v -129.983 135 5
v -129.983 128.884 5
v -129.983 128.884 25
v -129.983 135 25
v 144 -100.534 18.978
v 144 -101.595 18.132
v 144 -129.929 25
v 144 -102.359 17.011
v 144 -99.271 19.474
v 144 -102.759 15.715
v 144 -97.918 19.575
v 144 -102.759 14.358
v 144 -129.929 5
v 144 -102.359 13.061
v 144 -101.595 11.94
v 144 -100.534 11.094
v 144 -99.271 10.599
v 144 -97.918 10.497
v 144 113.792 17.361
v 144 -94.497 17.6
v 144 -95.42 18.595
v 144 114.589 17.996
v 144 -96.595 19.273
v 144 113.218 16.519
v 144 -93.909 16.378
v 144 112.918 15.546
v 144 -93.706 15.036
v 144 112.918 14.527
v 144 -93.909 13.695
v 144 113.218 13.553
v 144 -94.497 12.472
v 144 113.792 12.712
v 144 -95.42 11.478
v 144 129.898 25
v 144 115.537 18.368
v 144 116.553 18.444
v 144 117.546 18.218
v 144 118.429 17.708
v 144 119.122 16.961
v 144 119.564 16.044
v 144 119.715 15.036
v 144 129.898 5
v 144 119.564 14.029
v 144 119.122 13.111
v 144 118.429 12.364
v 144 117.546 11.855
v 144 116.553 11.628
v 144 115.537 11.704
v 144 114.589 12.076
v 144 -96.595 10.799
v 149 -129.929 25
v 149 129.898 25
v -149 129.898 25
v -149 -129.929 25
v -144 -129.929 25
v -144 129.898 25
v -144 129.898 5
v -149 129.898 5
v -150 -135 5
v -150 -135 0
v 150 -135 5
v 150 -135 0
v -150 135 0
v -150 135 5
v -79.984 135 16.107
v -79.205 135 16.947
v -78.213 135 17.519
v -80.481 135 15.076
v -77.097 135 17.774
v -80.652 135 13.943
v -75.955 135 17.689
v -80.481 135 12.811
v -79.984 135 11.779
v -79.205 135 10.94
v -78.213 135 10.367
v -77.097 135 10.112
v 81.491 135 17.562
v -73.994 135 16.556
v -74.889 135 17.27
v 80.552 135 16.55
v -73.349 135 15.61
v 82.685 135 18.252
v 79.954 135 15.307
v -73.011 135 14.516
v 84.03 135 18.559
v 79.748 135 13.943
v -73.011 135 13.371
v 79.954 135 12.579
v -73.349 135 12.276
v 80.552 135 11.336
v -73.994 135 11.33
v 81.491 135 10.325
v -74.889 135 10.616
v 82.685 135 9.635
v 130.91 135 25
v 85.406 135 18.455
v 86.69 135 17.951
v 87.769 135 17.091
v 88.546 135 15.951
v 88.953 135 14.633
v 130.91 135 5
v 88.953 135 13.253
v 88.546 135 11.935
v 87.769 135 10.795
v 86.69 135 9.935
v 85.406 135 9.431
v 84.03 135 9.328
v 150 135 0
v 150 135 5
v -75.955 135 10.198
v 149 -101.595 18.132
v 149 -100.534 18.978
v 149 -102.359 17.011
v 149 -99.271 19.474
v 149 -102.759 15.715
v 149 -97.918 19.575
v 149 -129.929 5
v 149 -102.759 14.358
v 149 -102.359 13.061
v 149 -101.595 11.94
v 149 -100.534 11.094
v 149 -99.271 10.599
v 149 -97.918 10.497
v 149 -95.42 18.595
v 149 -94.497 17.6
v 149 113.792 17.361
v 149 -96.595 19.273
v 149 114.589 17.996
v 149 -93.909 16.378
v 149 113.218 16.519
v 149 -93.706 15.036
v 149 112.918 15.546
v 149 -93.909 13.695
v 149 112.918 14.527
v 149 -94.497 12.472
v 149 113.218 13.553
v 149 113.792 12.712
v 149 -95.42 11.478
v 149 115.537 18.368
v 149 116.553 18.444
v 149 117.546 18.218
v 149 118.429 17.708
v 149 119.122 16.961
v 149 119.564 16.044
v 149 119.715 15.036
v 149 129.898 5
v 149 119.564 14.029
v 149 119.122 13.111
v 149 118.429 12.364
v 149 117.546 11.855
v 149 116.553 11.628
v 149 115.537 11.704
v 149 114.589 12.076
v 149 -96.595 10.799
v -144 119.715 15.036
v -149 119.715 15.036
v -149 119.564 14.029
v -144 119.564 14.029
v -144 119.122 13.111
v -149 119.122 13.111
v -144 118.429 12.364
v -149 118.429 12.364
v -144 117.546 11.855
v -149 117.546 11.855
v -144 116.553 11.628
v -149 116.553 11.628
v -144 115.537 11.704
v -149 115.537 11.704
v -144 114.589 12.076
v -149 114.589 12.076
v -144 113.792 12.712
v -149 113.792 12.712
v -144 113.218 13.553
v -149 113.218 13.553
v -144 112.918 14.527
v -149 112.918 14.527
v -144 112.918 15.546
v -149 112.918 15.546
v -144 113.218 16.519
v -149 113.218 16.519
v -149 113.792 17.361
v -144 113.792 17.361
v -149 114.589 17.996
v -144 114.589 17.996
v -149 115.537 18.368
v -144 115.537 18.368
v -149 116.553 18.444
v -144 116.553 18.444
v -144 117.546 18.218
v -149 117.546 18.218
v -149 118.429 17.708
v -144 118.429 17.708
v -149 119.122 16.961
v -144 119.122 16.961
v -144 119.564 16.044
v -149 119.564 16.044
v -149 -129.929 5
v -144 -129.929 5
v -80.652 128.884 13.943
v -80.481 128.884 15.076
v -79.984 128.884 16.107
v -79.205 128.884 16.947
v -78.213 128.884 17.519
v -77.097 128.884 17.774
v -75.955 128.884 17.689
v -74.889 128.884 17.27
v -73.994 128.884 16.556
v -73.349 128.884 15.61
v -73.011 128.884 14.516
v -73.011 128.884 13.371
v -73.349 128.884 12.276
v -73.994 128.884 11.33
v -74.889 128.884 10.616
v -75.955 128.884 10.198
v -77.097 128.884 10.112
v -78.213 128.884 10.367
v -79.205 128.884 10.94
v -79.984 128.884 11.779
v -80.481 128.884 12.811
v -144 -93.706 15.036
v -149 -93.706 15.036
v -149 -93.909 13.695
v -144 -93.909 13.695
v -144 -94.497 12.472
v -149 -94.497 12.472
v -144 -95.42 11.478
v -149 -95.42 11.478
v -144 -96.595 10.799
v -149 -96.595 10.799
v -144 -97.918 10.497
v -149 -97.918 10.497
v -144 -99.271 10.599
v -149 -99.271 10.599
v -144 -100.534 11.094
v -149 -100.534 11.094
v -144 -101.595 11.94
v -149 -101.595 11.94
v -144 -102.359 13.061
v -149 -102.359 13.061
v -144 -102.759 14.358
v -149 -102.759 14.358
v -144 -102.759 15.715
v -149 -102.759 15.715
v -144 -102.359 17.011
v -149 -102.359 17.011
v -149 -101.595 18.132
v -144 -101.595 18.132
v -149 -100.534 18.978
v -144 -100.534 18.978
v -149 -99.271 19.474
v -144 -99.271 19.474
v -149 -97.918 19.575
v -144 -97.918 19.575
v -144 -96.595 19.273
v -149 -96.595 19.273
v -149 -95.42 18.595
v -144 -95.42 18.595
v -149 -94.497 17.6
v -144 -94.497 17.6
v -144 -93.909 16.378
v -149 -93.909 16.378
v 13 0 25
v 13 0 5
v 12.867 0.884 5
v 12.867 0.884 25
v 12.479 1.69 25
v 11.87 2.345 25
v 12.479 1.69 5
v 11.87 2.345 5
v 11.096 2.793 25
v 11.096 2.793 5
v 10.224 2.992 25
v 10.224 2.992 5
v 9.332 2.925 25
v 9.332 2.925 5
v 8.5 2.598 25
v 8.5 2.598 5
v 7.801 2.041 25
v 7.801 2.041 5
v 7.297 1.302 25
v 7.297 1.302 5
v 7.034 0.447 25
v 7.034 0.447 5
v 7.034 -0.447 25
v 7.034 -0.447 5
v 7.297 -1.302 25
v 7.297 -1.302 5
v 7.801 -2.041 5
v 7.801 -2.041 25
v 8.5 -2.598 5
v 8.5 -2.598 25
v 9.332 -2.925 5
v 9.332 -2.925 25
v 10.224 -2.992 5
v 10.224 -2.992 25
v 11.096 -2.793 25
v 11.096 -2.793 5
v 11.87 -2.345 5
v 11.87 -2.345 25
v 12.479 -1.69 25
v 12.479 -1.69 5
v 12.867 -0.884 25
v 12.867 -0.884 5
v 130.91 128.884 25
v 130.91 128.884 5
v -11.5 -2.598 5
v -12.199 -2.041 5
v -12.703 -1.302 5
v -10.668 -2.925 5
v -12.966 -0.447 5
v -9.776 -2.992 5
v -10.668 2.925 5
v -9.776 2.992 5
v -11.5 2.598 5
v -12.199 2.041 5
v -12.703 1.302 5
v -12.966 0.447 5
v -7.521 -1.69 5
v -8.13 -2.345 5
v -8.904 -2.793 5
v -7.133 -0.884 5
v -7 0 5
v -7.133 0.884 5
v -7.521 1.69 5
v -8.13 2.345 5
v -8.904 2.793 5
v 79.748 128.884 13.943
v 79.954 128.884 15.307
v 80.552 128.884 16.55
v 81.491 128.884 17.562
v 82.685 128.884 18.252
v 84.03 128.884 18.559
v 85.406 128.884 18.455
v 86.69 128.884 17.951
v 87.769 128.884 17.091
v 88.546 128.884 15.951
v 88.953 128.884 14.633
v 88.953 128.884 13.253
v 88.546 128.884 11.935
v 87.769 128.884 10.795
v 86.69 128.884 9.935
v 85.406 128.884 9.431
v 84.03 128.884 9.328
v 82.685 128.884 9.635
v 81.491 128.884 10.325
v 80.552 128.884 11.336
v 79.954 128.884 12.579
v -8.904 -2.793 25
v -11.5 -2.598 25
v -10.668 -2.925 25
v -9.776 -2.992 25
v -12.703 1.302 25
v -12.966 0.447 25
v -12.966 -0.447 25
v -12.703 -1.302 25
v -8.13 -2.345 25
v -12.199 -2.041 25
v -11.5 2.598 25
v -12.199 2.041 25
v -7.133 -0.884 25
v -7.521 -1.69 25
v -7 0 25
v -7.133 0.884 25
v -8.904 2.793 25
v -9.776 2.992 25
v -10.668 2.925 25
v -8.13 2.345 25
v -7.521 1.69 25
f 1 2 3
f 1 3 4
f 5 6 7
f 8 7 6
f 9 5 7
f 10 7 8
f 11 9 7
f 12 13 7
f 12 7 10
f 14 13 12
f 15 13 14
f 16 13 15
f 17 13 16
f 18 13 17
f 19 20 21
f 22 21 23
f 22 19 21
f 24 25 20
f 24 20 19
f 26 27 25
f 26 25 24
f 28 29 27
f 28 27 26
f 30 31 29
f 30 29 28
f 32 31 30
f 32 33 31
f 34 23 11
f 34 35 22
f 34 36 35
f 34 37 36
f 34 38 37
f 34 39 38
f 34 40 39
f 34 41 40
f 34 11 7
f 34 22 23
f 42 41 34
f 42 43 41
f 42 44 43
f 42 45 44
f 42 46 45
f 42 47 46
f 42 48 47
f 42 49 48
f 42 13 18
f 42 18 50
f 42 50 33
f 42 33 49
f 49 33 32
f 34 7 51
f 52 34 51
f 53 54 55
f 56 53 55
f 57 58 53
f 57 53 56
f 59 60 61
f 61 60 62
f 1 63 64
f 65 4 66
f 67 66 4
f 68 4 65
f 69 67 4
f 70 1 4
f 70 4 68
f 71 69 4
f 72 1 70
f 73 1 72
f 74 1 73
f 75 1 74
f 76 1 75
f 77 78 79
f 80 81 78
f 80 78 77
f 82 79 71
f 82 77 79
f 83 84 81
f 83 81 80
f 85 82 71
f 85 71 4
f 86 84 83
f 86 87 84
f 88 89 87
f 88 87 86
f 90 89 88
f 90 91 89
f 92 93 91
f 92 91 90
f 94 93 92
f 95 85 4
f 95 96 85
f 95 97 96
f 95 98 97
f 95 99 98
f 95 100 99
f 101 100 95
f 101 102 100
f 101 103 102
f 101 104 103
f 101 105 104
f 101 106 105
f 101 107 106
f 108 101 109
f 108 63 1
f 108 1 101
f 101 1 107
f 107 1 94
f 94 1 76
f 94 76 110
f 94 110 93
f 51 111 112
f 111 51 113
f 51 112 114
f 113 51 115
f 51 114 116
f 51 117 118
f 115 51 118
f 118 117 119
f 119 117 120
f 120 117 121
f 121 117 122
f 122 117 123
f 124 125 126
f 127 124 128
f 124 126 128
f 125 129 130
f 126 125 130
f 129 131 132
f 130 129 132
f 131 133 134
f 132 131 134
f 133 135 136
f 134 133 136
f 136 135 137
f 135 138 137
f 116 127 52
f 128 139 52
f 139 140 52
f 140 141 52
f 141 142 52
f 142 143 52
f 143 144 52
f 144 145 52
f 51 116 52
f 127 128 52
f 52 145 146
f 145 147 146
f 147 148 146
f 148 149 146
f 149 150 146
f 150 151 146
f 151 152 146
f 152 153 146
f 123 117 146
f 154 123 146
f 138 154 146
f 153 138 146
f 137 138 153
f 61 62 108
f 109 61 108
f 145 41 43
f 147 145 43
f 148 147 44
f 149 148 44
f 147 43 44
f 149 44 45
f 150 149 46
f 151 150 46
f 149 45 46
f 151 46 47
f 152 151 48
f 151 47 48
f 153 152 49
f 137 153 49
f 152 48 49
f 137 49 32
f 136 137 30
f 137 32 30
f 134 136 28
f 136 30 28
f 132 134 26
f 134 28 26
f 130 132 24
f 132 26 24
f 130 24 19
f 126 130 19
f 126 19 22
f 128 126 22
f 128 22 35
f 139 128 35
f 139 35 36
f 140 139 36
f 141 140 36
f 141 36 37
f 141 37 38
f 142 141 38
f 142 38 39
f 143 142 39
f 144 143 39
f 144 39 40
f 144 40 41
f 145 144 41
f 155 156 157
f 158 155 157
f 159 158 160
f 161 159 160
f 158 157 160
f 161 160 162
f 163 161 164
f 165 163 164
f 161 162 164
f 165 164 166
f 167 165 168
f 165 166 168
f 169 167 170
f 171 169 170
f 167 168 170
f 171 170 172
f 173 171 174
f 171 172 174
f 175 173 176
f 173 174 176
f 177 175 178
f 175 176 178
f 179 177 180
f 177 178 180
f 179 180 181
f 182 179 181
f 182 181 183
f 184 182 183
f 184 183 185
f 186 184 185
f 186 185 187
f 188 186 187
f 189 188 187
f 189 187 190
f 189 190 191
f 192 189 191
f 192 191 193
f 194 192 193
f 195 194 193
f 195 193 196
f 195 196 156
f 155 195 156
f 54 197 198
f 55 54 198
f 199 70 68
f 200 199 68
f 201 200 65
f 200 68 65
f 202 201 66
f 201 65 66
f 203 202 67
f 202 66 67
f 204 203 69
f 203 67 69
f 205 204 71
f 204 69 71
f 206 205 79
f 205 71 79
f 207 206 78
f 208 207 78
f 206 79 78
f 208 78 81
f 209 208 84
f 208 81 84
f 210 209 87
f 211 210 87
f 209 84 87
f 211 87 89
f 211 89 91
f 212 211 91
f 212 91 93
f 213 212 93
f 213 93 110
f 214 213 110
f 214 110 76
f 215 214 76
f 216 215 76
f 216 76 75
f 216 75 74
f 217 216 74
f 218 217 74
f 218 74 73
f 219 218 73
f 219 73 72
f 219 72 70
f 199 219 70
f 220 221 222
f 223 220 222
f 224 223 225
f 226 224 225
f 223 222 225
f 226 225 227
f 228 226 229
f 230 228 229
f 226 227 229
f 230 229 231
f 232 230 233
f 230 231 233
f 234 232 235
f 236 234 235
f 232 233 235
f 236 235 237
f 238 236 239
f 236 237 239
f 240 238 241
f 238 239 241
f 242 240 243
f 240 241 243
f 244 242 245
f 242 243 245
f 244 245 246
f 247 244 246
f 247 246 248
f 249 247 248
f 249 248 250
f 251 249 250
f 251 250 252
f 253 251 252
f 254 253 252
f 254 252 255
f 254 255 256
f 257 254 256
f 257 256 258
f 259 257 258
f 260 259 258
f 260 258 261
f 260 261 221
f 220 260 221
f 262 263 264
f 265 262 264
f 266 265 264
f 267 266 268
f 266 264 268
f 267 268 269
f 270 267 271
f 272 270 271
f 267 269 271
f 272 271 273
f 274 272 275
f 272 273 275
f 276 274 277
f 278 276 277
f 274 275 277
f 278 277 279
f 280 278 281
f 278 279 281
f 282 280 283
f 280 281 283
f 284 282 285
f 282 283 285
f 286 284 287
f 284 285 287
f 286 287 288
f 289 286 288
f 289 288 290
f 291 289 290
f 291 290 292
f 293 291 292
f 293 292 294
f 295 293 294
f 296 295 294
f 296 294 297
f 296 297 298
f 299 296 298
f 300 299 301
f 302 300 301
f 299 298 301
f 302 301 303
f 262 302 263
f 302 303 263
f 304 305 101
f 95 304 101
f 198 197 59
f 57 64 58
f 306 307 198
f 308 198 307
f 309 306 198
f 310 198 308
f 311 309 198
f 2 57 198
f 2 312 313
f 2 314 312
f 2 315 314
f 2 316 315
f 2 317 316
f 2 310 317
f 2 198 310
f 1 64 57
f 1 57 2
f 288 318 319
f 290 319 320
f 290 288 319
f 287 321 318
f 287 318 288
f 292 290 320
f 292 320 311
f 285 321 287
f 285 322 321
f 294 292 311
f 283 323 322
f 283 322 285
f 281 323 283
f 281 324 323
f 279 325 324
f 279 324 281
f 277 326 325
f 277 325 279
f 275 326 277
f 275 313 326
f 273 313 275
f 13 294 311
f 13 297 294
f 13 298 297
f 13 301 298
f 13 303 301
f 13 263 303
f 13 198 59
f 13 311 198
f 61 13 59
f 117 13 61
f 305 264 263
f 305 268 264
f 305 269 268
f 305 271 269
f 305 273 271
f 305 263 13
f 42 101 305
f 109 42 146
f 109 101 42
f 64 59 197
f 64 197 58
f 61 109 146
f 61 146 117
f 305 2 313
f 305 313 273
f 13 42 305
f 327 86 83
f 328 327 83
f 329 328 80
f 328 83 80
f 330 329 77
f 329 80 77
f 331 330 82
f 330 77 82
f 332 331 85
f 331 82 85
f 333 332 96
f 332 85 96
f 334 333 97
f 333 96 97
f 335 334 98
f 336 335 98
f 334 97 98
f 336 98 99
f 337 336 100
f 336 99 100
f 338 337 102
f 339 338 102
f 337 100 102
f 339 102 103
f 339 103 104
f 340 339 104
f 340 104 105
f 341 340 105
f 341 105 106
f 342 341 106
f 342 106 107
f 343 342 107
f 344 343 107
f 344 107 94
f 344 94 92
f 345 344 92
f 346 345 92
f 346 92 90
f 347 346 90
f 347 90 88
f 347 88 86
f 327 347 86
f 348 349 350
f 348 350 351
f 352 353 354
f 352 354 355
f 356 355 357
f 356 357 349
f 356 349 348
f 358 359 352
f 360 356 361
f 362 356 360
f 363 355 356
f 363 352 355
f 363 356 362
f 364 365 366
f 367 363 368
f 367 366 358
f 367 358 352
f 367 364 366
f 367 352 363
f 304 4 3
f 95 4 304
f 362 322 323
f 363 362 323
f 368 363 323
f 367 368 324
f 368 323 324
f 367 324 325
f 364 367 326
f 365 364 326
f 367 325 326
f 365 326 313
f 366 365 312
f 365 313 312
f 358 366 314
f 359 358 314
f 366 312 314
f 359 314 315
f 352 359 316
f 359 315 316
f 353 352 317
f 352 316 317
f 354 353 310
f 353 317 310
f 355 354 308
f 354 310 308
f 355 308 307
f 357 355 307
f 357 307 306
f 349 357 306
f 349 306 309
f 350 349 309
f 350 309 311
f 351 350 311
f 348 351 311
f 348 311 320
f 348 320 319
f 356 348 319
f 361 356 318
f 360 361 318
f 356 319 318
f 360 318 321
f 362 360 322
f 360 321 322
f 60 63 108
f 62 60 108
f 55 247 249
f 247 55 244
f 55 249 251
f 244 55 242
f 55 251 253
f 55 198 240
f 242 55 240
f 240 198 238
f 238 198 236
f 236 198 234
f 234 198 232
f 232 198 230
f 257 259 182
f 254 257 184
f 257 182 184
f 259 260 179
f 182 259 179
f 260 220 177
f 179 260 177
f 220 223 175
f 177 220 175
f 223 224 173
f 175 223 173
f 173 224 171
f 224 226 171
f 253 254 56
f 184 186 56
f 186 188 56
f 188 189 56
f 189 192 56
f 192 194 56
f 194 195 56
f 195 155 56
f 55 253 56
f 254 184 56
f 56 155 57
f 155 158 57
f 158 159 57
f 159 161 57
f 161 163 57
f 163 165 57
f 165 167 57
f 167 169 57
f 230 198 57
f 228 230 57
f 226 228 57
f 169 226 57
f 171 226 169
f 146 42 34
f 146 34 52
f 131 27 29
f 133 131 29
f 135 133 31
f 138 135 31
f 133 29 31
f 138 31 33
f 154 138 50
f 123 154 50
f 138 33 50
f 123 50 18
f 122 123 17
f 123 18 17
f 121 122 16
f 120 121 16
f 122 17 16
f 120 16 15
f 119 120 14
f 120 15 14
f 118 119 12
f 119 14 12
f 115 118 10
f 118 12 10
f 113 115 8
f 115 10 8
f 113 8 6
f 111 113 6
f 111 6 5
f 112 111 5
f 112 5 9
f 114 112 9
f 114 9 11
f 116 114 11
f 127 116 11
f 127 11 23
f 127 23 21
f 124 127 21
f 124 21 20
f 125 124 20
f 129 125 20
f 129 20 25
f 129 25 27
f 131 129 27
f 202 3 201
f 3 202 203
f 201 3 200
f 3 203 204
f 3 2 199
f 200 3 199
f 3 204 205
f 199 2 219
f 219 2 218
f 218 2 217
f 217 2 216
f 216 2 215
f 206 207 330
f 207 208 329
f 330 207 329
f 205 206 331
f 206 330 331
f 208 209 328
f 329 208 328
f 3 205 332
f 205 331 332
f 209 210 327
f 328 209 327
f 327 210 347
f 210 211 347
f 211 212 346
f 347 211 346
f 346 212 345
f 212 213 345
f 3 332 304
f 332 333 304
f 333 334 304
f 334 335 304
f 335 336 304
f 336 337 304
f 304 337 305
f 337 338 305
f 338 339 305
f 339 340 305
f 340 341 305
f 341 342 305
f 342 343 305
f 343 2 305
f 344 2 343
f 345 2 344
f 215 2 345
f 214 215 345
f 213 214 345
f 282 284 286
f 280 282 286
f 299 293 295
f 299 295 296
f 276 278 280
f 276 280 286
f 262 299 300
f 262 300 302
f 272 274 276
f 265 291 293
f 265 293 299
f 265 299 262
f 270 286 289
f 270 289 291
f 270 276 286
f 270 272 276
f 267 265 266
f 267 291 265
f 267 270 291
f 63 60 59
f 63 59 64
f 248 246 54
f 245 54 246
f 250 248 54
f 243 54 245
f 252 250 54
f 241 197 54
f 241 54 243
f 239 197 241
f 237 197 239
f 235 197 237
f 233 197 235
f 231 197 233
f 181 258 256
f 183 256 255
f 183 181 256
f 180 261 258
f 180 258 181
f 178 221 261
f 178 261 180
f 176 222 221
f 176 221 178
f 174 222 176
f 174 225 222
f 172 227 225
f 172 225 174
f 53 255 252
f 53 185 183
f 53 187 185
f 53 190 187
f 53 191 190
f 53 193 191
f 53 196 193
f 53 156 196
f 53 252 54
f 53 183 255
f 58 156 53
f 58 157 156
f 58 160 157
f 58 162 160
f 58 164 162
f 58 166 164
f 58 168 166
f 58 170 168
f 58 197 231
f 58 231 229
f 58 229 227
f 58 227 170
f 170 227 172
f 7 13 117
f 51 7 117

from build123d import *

# Parameters (mm, degrees)
CROQUIS1_W              = 300
CROQUIS1_H              = 270
SALIENTE_EXTRUIR1_DEPTH = 5
CROQUIS2_W              = 5
CROQUIS2_H              = 259.826620651
CROQUIS2_W_2            = 260.893012834
CROQUIS2_H_2            = 6.115910783
SALIENTE_EXTRUIR2_DEPTH = 20
CROQUIS3_R              = 3.417677686
CROQUIS3_R_2            = 4.551592261
CORTAR_EXTRUIR1_DEPTH   = 330.015197217
CROQUIS4_R              = 3
SALIENTE_EXTRUIR3_DEPTH = 20
CROQUIS5_R              = 3.841776338
CROQUIS5_R_2            = 4.628228364
CORTAR_EXTRUIR2_DEPTH   = 20


with BuildPart() as part:
    # Croquis1 → Saliente-Extruir1 (new body)
    with BuildSketch(Plane.XY):
        Rectangle(CROQUIS1_W, CROQUIS1_H)
    extrude(amount=SALIENTE_EXTRUIR1_DEPTH)

    # Croquis2 → Saliente-Extruir2 (add)
    with BuildSketch(Plane.XY.offset(5)):
        with Locations((-146.5, -0.015689121)):
            Rectangle(CROQUIS2_W, CROQUIS2_H)
        with Locations((146.5, -0.015689121)):
            Rectangle(CROQUIS2_W, CROQUIS2_H)
        with Locations((0.463771802, 131.942044608)):
            Rectangle(CROQUIS2_W_2, CROQUIS2_H_2)
    extrude(amount=SALIENTE_EXTRUIR2_DEPTH)

    # Croquis3 → Cortar-Extruir1 (cut, through all)
    with BuildSketch(Plane.ZY.offset(149)):
        with Locations(Location((15.036244293, 116.297685092, 0), (0, 0, 90))):
            Circle(CROQUIS3_R)
        with Locations(Location((15.036244293, -98.258041649, 0), (0, 0, 90))):
            Circle(CROQUIS3_R_2)
    extrude(amount=-CORTAR_EXTRUIR1_DEPTH, mode=Mode.SUBTRACT)

    # Croquis4 → Saliente-Extruir3 (add)
    with BuildSketch(Plane.XY.offset(5)):
        with Locations((-10, 0)):
            Circle(CROQUIS4_R)
        with Locations((10, 0)):
            Circle(CROQUIS4_R)
    extrude(amount=SALIENTE_EXTRUIR3_DEPTH)

    # Croquis5 → Cortar-Extruir2 (cut)
    with BuildSketch(Plane(origin=(0, 135, 0), x_dir=(1, 0, 0), z_dir=(0, 1, 0))):
        with Locations(Location((-76.809917119, -13.943258858, 0), (0, 0, 180))):
            Circle(CROQUIS5_R)
        with Locations(Location((84.376229975, -13.943258858, 0), (0, 0, 180))):
            Circle(CROQUIS5_R_2)
    extrude(amount=-CORTAR_EXTRUIR2_DEPTH, mode=Mode.SUBTRACT)


solid = part.part
